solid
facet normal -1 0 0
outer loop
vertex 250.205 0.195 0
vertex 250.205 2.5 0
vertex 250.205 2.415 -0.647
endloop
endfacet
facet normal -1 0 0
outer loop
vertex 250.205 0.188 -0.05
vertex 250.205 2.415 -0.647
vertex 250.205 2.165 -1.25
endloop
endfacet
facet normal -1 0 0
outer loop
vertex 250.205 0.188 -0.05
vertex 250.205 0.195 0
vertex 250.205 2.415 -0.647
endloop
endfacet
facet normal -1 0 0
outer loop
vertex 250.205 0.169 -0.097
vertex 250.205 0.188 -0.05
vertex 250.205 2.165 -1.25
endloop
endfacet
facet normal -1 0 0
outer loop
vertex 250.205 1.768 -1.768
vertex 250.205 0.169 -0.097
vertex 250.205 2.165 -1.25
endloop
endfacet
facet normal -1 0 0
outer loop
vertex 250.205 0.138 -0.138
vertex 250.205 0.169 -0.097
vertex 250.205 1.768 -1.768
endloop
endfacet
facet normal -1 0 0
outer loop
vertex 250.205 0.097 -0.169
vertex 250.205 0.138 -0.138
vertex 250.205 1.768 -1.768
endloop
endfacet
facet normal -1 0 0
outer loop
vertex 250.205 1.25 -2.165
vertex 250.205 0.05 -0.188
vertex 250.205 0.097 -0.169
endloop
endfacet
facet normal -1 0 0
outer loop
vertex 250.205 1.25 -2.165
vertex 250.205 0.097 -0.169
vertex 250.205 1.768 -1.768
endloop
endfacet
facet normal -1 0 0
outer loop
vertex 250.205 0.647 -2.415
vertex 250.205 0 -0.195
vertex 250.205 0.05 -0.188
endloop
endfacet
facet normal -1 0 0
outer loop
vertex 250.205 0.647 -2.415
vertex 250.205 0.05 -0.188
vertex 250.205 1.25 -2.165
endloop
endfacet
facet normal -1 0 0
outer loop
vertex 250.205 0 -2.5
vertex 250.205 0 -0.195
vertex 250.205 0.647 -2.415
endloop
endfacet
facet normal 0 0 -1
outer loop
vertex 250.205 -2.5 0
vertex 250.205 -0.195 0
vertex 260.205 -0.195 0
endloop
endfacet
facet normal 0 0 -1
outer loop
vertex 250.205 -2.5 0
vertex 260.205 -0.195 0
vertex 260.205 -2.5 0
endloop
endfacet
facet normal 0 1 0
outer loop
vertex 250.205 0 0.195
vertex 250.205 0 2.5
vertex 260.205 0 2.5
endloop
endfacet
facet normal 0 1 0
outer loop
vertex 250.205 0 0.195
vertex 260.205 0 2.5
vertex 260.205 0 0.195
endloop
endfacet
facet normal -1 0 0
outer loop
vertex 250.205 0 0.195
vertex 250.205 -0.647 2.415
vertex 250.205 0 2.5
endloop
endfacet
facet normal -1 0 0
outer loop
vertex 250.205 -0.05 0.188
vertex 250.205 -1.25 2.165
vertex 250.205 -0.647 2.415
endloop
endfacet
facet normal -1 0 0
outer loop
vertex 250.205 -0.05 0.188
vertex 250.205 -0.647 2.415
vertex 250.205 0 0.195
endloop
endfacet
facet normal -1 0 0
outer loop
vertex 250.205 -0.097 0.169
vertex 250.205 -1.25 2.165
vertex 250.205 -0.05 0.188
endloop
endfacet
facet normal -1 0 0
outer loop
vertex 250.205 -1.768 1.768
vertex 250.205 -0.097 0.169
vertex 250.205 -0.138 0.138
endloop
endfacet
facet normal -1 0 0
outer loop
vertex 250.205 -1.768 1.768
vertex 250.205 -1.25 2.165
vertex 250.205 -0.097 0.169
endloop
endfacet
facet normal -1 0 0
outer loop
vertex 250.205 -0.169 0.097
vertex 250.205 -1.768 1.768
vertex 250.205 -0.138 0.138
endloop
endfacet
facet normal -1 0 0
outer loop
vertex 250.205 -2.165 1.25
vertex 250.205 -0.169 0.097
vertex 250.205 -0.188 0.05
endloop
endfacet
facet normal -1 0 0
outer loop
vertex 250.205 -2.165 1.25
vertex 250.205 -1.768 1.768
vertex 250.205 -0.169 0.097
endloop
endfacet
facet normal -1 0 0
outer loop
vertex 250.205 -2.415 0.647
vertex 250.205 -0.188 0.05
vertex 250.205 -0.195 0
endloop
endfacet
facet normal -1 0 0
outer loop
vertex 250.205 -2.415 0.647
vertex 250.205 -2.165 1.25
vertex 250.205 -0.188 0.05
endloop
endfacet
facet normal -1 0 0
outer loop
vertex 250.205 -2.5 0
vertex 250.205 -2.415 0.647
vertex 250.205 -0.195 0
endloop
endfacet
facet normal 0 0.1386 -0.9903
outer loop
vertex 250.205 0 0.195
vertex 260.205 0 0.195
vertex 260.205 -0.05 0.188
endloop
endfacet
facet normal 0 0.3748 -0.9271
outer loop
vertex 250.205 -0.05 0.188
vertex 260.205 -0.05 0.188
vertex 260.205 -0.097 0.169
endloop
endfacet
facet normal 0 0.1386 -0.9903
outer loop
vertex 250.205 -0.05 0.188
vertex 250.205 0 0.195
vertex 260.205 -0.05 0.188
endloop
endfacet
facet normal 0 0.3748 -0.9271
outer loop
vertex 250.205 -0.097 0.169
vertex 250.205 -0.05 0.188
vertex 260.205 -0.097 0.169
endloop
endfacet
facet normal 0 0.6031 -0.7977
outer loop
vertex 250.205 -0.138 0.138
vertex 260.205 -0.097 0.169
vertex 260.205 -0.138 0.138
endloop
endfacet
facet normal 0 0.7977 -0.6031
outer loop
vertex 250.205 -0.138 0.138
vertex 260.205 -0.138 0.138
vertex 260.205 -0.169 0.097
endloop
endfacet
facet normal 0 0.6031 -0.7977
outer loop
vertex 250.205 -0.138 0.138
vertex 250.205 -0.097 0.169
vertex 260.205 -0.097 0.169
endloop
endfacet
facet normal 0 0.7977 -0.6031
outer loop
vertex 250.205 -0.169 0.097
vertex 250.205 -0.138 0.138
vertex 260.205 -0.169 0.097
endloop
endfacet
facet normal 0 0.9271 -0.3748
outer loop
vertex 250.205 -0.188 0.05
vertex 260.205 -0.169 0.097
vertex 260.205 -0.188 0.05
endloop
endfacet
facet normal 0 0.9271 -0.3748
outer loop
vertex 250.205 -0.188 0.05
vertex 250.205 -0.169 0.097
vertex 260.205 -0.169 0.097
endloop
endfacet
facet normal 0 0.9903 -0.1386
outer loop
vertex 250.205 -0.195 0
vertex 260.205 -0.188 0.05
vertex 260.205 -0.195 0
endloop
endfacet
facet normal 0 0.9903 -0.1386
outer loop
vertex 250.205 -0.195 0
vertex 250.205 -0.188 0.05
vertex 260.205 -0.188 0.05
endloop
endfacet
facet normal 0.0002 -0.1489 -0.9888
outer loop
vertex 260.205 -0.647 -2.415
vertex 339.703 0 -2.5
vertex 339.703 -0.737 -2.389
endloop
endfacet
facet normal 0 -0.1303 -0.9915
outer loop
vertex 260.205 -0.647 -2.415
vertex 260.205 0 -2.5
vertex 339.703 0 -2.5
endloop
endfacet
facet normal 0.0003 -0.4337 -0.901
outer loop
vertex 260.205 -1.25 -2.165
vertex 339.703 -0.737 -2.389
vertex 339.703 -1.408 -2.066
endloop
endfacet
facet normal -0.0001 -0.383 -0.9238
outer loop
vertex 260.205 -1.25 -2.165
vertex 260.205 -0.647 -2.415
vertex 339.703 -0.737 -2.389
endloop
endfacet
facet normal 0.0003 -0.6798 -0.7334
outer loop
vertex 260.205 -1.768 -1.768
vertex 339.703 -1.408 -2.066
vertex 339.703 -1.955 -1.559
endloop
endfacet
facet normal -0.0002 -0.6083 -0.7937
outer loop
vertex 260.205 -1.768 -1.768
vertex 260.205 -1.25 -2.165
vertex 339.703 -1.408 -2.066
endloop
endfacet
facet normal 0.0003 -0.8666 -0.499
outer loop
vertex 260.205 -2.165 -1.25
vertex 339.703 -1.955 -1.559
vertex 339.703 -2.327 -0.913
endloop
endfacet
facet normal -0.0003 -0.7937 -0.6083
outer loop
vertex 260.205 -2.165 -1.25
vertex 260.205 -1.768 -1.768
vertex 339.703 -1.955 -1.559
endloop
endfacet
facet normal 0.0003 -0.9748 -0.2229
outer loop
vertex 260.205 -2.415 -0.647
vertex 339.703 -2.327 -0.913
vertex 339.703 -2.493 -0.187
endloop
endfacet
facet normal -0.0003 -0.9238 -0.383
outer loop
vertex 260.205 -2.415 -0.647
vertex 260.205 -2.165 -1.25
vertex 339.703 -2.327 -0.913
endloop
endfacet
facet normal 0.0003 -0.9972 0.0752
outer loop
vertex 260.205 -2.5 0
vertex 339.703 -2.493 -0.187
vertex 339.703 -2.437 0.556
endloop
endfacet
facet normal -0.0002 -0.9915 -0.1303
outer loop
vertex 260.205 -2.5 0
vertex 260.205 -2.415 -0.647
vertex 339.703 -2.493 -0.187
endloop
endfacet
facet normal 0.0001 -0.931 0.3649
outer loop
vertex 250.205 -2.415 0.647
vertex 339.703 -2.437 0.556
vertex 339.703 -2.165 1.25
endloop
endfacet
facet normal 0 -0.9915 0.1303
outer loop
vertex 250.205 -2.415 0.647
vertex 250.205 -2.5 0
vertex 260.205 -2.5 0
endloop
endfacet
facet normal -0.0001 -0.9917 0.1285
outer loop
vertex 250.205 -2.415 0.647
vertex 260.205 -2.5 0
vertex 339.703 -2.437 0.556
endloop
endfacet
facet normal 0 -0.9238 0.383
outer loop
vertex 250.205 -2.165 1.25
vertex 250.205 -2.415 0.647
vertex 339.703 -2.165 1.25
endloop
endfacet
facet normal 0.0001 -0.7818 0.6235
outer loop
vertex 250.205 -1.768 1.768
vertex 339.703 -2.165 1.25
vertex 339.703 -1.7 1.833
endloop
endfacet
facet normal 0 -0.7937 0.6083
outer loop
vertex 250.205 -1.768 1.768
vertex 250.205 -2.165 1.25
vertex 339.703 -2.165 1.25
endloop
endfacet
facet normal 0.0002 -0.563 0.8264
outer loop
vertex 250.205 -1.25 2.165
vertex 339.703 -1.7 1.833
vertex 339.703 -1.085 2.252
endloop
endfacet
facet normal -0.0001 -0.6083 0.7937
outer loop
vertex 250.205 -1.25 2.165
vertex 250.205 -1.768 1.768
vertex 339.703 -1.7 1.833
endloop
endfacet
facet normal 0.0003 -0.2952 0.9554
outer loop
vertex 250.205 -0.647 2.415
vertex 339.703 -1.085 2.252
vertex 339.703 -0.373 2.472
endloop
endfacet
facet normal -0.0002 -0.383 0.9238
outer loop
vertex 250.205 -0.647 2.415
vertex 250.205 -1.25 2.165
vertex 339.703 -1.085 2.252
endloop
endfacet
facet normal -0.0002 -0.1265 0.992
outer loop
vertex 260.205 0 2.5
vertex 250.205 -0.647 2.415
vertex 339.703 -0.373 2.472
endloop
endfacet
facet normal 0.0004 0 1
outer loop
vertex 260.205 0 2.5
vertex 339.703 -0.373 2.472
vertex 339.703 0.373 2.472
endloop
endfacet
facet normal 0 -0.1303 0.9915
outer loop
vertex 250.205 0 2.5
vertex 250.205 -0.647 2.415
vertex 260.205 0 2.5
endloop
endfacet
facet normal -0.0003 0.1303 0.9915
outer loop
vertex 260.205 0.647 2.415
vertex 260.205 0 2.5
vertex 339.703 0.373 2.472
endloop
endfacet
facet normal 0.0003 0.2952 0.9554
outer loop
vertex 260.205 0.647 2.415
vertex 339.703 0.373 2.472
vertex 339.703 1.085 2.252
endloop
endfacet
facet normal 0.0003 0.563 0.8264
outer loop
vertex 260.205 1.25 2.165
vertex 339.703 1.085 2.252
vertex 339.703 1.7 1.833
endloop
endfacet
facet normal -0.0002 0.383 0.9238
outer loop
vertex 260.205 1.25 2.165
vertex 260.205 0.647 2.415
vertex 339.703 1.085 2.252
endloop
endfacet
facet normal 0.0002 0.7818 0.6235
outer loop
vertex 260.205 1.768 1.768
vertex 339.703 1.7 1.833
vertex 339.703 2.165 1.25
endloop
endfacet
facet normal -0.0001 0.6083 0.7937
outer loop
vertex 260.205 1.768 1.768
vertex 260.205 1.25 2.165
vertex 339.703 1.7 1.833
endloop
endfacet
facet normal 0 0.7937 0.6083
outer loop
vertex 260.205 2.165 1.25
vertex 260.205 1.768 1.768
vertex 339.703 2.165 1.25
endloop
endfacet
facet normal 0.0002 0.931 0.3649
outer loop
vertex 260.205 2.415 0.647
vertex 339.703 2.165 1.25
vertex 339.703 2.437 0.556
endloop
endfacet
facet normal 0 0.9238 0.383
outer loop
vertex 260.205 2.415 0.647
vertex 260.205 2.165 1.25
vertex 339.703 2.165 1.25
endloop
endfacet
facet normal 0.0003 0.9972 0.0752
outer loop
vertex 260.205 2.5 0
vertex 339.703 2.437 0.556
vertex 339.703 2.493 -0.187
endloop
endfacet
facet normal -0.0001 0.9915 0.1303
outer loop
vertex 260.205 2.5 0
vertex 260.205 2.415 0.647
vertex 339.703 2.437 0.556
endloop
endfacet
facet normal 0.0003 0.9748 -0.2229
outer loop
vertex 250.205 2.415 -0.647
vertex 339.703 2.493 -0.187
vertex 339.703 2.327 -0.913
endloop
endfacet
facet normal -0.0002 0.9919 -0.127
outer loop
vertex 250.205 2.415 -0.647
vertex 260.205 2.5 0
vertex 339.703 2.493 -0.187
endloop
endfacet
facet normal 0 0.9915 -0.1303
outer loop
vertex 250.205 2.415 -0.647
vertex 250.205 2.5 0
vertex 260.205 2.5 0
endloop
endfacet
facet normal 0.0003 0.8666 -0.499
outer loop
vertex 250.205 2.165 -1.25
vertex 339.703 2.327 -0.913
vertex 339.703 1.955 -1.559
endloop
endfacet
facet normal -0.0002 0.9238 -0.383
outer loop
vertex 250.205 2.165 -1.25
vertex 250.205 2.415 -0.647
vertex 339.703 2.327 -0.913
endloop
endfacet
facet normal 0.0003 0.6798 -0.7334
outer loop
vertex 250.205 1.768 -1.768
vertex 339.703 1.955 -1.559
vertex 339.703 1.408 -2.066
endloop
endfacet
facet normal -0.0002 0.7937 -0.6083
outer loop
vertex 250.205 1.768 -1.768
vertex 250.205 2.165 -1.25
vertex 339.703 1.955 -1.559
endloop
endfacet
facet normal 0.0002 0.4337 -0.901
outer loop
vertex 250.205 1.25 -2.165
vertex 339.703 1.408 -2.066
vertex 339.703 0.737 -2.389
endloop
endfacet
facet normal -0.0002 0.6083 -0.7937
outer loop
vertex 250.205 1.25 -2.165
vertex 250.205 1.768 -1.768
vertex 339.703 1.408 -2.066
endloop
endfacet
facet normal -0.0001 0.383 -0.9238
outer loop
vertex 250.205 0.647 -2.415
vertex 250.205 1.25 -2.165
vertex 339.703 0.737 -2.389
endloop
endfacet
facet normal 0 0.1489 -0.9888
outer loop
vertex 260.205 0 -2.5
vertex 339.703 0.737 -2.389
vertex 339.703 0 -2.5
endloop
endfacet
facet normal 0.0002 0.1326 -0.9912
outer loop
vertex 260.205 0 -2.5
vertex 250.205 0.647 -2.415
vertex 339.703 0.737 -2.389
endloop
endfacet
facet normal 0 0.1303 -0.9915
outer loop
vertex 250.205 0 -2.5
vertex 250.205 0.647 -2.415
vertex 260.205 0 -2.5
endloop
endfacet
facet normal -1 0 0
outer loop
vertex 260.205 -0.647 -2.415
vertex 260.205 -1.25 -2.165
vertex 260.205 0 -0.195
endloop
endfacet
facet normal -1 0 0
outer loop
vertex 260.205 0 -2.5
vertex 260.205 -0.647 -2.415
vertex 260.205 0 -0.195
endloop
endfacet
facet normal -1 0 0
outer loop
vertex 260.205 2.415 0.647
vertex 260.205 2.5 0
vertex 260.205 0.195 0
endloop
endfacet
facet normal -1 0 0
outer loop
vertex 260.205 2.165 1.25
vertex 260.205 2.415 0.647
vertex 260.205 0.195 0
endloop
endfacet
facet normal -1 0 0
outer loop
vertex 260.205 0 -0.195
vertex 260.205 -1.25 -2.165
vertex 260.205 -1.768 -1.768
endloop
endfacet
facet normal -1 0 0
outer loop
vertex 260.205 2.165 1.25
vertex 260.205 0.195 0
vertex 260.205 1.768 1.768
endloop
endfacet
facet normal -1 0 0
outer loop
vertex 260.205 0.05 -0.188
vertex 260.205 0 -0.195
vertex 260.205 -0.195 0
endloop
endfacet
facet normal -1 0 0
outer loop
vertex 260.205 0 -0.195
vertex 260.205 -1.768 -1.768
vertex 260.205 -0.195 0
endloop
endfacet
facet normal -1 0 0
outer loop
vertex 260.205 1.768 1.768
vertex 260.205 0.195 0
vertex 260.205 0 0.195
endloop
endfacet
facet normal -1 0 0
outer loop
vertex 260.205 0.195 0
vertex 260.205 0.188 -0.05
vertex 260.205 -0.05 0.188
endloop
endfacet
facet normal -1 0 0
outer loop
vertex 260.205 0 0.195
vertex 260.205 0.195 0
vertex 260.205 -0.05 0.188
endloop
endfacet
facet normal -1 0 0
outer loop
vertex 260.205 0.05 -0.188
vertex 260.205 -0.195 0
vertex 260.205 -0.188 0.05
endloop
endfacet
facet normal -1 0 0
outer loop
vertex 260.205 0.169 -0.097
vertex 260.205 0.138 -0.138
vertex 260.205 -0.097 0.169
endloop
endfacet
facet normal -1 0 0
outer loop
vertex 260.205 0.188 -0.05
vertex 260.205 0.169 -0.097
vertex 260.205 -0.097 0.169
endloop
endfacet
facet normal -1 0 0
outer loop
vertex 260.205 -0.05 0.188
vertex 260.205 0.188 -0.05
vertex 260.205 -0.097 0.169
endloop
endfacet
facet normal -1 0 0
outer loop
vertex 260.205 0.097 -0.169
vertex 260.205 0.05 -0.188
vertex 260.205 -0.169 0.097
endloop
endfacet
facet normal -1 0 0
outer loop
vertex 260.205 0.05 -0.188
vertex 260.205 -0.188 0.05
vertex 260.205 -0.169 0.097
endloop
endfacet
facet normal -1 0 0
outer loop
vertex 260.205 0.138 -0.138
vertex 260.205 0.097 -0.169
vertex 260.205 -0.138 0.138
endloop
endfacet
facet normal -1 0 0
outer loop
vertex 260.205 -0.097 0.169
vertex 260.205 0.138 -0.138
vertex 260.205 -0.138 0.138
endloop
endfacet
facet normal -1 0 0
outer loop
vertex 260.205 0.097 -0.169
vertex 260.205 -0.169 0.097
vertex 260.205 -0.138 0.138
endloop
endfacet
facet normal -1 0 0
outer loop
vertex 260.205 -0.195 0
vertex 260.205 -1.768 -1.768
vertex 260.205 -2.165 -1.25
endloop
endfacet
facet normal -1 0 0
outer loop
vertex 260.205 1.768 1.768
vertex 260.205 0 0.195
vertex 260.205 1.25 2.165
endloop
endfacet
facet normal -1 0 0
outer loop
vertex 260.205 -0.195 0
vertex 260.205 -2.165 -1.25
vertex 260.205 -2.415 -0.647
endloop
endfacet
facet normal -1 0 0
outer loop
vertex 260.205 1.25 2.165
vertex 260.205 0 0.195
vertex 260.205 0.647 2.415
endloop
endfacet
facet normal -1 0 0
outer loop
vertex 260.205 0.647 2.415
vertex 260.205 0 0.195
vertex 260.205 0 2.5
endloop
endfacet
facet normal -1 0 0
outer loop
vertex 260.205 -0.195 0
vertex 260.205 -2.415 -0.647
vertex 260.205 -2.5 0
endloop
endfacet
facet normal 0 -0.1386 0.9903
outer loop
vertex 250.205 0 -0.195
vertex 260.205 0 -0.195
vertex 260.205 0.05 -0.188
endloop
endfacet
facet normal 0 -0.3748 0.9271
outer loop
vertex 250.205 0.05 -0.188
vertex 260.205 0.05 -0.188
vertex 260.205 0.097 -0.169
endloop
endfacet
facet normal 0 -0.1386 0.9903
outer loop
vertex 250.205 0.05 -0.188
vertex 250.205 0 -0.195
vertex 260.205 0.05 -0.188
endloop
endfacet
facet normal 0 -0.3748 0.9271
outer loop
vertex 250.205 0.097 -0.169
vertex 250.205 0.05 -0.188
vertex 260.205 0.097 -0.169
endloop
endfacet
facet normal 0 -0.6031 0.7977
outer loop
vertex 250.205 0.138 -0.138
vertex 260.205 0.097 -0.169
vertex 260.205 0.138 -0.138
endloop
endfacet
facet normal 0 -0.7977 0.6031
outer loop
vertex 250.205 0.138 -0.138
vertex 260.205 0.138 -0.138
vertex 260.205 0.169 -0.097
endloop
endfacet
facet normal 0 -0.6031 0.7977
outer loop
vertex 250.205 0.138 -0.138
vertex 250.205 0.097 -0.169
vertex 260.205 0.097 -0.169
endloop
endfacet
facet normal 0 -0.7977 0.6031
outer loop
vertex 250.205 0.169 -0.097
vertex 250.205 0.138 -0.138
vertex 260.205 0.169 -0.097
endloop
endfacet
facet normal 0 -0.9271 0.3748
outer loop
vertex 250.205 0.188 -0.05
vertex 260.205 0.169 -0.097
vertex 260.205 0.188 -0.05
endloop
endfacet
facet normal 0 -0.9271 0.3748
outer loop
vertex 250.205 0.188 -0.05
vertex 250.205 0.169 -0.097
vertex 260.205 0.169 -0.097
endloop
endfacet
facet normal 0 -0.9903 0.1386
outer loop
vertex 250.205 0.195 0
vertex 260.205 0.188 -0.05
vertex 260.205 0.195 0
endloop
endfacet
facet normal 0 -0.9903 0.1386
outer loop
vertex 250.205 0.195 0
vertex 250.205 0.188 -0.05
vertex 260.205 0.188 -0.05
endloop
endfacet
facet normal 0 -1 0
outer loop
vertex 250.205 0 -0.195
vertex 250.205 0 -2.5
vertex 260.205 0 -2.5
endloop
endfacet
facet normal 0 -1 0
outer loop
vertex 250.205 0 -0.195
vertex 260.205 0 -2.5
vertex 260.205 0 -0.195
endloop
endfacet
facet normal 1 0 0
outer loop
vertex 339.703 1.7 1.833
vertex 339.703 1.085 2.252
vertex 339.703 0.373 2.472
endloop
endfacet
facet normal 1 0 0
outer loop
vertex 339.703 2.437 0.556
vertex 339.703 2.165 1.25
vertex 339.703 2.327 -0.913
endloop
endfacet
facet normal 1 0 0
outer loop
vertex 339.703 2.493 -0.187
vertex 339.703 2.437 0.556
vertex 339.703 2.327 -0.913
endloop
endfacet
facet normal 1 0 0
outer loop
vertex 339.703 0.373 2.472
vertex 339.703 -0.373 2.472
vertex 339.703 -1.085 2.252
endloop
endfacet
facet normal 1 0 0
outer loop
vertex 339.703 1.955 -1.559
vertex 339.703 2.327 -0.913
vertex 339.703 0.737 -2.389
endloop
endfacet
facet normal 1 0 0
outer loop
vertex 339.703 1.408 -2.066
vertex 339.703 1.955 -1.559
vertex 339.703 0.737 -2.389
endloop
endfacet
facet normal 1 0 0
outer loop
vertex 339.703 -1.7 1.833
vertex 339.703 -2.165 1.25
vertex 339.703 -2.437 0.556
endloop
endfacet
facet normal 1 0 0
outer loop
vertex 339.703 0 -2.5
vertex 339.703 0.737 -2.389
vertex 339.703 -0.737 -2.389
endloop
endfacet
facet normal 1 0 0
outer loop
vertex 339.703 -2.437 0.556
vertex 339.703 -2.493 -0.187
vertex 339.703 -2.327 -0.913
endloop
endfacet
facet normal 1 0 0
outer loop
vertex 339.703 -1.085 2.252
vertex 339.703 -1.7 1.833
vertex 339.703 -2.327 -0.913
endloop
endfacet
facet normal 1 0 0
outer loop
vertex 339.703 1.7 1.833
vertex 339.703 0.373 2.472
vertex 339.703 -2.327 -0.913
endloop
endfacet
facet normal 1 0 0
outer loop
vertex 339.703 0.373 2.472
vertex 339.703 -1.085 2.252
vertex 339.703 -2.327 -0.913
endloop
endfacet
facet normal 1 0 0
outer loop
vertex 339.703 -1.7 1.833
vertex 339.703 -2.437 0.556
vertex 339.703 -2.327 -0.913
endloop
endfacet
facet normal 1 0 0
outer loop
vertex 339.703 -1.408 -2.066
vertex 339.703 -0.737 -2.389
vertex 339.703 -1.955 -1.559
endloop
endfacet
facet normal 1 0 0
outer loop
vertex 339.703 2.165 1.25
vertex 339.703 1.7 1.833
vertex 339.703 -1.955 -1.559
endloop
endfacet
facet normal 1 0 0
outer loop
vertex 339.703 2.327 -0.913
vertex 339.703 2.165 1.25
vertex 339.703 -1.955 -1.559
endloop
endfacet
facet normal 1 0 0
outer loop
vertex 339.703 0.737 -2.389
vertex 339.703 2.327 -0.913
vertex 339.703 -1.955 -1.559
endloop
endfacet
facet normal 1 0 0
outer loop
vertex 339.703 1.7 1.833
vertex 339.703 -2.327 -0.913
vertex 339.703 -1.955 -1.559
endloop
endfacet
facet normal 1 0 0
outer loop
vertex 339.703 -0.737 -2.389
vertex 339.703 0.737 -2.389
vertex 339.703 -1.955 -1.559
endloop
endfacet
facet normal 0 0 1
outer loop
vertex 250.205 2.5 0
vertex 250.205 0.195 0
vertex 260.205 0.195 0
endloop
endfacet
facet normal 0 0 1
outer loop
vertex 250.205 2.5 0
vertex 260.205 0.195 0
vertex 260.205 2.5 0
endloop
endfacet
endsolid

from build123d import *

# Parameters (mm, degrees)
SWEEP1_PROFILE_R   = 2.5
CUT_EXTRUDE1_DEPTH = 10


with BuildPart() as part:
    # Sweep1: sweep along a path in Sketch1
    with BuildLine(Plane(origin=(0, 0, 0), x_dir=(1, 0, 0), z_dir=(0, 1, 0))) as sweep1_path:
        Line((339.702814789, 0), (324.702814789, 0))
        Line((324.702814789, 0), (250.204561609, 0))
    # Sweep1 profile (on start of the path) → Sweep1 (sweep)
    with BuildSketch(Plane(origin=(339.702814789, 0, 0), x_dir=(0, 0, -1), z_dir=(-1, 0, 0))):
        Circle(SWEEP1_PROFILE_R)
    sweep(path=sweep1_path.line)

    # Sketch4 → Cut-Extrude1 (cut)
    with BuildSketch(Plane(origin=(250.204561609, 0, 0), x_dir=(0, 0, -1), z_dir=(-1, 0, 0))):
        with BuildLine():
            Line((-2.5, 0), (-0.194982329, 0))
            ThreePointArc((-0.194982329, 0), (-0.137873327, 0.137873327), (0, 0.194982329))
            Line((0, 0.194982329), (0, 2.5))
            ThreePointArc((0, 2.5), (1.767766953, 1.767766953), (2.5, 0))
            Line((2.5, 0), (0.194982329, 0))
            ThreePointArc((0.194982329, 0), (0.137873327, -0.137873327), (0, -0.194982329))
            Line((0, -0.194982329), (0, -2.5))
            ThreePointArc((0, -2.5), (-1.767766953, -1.767766953), (-2.5, 0))
        make_face()
    extrude(amount=-CUT_EXTRUDE1_DEPTH, mode=Mode.SUBTRACT)


solid = part.part
